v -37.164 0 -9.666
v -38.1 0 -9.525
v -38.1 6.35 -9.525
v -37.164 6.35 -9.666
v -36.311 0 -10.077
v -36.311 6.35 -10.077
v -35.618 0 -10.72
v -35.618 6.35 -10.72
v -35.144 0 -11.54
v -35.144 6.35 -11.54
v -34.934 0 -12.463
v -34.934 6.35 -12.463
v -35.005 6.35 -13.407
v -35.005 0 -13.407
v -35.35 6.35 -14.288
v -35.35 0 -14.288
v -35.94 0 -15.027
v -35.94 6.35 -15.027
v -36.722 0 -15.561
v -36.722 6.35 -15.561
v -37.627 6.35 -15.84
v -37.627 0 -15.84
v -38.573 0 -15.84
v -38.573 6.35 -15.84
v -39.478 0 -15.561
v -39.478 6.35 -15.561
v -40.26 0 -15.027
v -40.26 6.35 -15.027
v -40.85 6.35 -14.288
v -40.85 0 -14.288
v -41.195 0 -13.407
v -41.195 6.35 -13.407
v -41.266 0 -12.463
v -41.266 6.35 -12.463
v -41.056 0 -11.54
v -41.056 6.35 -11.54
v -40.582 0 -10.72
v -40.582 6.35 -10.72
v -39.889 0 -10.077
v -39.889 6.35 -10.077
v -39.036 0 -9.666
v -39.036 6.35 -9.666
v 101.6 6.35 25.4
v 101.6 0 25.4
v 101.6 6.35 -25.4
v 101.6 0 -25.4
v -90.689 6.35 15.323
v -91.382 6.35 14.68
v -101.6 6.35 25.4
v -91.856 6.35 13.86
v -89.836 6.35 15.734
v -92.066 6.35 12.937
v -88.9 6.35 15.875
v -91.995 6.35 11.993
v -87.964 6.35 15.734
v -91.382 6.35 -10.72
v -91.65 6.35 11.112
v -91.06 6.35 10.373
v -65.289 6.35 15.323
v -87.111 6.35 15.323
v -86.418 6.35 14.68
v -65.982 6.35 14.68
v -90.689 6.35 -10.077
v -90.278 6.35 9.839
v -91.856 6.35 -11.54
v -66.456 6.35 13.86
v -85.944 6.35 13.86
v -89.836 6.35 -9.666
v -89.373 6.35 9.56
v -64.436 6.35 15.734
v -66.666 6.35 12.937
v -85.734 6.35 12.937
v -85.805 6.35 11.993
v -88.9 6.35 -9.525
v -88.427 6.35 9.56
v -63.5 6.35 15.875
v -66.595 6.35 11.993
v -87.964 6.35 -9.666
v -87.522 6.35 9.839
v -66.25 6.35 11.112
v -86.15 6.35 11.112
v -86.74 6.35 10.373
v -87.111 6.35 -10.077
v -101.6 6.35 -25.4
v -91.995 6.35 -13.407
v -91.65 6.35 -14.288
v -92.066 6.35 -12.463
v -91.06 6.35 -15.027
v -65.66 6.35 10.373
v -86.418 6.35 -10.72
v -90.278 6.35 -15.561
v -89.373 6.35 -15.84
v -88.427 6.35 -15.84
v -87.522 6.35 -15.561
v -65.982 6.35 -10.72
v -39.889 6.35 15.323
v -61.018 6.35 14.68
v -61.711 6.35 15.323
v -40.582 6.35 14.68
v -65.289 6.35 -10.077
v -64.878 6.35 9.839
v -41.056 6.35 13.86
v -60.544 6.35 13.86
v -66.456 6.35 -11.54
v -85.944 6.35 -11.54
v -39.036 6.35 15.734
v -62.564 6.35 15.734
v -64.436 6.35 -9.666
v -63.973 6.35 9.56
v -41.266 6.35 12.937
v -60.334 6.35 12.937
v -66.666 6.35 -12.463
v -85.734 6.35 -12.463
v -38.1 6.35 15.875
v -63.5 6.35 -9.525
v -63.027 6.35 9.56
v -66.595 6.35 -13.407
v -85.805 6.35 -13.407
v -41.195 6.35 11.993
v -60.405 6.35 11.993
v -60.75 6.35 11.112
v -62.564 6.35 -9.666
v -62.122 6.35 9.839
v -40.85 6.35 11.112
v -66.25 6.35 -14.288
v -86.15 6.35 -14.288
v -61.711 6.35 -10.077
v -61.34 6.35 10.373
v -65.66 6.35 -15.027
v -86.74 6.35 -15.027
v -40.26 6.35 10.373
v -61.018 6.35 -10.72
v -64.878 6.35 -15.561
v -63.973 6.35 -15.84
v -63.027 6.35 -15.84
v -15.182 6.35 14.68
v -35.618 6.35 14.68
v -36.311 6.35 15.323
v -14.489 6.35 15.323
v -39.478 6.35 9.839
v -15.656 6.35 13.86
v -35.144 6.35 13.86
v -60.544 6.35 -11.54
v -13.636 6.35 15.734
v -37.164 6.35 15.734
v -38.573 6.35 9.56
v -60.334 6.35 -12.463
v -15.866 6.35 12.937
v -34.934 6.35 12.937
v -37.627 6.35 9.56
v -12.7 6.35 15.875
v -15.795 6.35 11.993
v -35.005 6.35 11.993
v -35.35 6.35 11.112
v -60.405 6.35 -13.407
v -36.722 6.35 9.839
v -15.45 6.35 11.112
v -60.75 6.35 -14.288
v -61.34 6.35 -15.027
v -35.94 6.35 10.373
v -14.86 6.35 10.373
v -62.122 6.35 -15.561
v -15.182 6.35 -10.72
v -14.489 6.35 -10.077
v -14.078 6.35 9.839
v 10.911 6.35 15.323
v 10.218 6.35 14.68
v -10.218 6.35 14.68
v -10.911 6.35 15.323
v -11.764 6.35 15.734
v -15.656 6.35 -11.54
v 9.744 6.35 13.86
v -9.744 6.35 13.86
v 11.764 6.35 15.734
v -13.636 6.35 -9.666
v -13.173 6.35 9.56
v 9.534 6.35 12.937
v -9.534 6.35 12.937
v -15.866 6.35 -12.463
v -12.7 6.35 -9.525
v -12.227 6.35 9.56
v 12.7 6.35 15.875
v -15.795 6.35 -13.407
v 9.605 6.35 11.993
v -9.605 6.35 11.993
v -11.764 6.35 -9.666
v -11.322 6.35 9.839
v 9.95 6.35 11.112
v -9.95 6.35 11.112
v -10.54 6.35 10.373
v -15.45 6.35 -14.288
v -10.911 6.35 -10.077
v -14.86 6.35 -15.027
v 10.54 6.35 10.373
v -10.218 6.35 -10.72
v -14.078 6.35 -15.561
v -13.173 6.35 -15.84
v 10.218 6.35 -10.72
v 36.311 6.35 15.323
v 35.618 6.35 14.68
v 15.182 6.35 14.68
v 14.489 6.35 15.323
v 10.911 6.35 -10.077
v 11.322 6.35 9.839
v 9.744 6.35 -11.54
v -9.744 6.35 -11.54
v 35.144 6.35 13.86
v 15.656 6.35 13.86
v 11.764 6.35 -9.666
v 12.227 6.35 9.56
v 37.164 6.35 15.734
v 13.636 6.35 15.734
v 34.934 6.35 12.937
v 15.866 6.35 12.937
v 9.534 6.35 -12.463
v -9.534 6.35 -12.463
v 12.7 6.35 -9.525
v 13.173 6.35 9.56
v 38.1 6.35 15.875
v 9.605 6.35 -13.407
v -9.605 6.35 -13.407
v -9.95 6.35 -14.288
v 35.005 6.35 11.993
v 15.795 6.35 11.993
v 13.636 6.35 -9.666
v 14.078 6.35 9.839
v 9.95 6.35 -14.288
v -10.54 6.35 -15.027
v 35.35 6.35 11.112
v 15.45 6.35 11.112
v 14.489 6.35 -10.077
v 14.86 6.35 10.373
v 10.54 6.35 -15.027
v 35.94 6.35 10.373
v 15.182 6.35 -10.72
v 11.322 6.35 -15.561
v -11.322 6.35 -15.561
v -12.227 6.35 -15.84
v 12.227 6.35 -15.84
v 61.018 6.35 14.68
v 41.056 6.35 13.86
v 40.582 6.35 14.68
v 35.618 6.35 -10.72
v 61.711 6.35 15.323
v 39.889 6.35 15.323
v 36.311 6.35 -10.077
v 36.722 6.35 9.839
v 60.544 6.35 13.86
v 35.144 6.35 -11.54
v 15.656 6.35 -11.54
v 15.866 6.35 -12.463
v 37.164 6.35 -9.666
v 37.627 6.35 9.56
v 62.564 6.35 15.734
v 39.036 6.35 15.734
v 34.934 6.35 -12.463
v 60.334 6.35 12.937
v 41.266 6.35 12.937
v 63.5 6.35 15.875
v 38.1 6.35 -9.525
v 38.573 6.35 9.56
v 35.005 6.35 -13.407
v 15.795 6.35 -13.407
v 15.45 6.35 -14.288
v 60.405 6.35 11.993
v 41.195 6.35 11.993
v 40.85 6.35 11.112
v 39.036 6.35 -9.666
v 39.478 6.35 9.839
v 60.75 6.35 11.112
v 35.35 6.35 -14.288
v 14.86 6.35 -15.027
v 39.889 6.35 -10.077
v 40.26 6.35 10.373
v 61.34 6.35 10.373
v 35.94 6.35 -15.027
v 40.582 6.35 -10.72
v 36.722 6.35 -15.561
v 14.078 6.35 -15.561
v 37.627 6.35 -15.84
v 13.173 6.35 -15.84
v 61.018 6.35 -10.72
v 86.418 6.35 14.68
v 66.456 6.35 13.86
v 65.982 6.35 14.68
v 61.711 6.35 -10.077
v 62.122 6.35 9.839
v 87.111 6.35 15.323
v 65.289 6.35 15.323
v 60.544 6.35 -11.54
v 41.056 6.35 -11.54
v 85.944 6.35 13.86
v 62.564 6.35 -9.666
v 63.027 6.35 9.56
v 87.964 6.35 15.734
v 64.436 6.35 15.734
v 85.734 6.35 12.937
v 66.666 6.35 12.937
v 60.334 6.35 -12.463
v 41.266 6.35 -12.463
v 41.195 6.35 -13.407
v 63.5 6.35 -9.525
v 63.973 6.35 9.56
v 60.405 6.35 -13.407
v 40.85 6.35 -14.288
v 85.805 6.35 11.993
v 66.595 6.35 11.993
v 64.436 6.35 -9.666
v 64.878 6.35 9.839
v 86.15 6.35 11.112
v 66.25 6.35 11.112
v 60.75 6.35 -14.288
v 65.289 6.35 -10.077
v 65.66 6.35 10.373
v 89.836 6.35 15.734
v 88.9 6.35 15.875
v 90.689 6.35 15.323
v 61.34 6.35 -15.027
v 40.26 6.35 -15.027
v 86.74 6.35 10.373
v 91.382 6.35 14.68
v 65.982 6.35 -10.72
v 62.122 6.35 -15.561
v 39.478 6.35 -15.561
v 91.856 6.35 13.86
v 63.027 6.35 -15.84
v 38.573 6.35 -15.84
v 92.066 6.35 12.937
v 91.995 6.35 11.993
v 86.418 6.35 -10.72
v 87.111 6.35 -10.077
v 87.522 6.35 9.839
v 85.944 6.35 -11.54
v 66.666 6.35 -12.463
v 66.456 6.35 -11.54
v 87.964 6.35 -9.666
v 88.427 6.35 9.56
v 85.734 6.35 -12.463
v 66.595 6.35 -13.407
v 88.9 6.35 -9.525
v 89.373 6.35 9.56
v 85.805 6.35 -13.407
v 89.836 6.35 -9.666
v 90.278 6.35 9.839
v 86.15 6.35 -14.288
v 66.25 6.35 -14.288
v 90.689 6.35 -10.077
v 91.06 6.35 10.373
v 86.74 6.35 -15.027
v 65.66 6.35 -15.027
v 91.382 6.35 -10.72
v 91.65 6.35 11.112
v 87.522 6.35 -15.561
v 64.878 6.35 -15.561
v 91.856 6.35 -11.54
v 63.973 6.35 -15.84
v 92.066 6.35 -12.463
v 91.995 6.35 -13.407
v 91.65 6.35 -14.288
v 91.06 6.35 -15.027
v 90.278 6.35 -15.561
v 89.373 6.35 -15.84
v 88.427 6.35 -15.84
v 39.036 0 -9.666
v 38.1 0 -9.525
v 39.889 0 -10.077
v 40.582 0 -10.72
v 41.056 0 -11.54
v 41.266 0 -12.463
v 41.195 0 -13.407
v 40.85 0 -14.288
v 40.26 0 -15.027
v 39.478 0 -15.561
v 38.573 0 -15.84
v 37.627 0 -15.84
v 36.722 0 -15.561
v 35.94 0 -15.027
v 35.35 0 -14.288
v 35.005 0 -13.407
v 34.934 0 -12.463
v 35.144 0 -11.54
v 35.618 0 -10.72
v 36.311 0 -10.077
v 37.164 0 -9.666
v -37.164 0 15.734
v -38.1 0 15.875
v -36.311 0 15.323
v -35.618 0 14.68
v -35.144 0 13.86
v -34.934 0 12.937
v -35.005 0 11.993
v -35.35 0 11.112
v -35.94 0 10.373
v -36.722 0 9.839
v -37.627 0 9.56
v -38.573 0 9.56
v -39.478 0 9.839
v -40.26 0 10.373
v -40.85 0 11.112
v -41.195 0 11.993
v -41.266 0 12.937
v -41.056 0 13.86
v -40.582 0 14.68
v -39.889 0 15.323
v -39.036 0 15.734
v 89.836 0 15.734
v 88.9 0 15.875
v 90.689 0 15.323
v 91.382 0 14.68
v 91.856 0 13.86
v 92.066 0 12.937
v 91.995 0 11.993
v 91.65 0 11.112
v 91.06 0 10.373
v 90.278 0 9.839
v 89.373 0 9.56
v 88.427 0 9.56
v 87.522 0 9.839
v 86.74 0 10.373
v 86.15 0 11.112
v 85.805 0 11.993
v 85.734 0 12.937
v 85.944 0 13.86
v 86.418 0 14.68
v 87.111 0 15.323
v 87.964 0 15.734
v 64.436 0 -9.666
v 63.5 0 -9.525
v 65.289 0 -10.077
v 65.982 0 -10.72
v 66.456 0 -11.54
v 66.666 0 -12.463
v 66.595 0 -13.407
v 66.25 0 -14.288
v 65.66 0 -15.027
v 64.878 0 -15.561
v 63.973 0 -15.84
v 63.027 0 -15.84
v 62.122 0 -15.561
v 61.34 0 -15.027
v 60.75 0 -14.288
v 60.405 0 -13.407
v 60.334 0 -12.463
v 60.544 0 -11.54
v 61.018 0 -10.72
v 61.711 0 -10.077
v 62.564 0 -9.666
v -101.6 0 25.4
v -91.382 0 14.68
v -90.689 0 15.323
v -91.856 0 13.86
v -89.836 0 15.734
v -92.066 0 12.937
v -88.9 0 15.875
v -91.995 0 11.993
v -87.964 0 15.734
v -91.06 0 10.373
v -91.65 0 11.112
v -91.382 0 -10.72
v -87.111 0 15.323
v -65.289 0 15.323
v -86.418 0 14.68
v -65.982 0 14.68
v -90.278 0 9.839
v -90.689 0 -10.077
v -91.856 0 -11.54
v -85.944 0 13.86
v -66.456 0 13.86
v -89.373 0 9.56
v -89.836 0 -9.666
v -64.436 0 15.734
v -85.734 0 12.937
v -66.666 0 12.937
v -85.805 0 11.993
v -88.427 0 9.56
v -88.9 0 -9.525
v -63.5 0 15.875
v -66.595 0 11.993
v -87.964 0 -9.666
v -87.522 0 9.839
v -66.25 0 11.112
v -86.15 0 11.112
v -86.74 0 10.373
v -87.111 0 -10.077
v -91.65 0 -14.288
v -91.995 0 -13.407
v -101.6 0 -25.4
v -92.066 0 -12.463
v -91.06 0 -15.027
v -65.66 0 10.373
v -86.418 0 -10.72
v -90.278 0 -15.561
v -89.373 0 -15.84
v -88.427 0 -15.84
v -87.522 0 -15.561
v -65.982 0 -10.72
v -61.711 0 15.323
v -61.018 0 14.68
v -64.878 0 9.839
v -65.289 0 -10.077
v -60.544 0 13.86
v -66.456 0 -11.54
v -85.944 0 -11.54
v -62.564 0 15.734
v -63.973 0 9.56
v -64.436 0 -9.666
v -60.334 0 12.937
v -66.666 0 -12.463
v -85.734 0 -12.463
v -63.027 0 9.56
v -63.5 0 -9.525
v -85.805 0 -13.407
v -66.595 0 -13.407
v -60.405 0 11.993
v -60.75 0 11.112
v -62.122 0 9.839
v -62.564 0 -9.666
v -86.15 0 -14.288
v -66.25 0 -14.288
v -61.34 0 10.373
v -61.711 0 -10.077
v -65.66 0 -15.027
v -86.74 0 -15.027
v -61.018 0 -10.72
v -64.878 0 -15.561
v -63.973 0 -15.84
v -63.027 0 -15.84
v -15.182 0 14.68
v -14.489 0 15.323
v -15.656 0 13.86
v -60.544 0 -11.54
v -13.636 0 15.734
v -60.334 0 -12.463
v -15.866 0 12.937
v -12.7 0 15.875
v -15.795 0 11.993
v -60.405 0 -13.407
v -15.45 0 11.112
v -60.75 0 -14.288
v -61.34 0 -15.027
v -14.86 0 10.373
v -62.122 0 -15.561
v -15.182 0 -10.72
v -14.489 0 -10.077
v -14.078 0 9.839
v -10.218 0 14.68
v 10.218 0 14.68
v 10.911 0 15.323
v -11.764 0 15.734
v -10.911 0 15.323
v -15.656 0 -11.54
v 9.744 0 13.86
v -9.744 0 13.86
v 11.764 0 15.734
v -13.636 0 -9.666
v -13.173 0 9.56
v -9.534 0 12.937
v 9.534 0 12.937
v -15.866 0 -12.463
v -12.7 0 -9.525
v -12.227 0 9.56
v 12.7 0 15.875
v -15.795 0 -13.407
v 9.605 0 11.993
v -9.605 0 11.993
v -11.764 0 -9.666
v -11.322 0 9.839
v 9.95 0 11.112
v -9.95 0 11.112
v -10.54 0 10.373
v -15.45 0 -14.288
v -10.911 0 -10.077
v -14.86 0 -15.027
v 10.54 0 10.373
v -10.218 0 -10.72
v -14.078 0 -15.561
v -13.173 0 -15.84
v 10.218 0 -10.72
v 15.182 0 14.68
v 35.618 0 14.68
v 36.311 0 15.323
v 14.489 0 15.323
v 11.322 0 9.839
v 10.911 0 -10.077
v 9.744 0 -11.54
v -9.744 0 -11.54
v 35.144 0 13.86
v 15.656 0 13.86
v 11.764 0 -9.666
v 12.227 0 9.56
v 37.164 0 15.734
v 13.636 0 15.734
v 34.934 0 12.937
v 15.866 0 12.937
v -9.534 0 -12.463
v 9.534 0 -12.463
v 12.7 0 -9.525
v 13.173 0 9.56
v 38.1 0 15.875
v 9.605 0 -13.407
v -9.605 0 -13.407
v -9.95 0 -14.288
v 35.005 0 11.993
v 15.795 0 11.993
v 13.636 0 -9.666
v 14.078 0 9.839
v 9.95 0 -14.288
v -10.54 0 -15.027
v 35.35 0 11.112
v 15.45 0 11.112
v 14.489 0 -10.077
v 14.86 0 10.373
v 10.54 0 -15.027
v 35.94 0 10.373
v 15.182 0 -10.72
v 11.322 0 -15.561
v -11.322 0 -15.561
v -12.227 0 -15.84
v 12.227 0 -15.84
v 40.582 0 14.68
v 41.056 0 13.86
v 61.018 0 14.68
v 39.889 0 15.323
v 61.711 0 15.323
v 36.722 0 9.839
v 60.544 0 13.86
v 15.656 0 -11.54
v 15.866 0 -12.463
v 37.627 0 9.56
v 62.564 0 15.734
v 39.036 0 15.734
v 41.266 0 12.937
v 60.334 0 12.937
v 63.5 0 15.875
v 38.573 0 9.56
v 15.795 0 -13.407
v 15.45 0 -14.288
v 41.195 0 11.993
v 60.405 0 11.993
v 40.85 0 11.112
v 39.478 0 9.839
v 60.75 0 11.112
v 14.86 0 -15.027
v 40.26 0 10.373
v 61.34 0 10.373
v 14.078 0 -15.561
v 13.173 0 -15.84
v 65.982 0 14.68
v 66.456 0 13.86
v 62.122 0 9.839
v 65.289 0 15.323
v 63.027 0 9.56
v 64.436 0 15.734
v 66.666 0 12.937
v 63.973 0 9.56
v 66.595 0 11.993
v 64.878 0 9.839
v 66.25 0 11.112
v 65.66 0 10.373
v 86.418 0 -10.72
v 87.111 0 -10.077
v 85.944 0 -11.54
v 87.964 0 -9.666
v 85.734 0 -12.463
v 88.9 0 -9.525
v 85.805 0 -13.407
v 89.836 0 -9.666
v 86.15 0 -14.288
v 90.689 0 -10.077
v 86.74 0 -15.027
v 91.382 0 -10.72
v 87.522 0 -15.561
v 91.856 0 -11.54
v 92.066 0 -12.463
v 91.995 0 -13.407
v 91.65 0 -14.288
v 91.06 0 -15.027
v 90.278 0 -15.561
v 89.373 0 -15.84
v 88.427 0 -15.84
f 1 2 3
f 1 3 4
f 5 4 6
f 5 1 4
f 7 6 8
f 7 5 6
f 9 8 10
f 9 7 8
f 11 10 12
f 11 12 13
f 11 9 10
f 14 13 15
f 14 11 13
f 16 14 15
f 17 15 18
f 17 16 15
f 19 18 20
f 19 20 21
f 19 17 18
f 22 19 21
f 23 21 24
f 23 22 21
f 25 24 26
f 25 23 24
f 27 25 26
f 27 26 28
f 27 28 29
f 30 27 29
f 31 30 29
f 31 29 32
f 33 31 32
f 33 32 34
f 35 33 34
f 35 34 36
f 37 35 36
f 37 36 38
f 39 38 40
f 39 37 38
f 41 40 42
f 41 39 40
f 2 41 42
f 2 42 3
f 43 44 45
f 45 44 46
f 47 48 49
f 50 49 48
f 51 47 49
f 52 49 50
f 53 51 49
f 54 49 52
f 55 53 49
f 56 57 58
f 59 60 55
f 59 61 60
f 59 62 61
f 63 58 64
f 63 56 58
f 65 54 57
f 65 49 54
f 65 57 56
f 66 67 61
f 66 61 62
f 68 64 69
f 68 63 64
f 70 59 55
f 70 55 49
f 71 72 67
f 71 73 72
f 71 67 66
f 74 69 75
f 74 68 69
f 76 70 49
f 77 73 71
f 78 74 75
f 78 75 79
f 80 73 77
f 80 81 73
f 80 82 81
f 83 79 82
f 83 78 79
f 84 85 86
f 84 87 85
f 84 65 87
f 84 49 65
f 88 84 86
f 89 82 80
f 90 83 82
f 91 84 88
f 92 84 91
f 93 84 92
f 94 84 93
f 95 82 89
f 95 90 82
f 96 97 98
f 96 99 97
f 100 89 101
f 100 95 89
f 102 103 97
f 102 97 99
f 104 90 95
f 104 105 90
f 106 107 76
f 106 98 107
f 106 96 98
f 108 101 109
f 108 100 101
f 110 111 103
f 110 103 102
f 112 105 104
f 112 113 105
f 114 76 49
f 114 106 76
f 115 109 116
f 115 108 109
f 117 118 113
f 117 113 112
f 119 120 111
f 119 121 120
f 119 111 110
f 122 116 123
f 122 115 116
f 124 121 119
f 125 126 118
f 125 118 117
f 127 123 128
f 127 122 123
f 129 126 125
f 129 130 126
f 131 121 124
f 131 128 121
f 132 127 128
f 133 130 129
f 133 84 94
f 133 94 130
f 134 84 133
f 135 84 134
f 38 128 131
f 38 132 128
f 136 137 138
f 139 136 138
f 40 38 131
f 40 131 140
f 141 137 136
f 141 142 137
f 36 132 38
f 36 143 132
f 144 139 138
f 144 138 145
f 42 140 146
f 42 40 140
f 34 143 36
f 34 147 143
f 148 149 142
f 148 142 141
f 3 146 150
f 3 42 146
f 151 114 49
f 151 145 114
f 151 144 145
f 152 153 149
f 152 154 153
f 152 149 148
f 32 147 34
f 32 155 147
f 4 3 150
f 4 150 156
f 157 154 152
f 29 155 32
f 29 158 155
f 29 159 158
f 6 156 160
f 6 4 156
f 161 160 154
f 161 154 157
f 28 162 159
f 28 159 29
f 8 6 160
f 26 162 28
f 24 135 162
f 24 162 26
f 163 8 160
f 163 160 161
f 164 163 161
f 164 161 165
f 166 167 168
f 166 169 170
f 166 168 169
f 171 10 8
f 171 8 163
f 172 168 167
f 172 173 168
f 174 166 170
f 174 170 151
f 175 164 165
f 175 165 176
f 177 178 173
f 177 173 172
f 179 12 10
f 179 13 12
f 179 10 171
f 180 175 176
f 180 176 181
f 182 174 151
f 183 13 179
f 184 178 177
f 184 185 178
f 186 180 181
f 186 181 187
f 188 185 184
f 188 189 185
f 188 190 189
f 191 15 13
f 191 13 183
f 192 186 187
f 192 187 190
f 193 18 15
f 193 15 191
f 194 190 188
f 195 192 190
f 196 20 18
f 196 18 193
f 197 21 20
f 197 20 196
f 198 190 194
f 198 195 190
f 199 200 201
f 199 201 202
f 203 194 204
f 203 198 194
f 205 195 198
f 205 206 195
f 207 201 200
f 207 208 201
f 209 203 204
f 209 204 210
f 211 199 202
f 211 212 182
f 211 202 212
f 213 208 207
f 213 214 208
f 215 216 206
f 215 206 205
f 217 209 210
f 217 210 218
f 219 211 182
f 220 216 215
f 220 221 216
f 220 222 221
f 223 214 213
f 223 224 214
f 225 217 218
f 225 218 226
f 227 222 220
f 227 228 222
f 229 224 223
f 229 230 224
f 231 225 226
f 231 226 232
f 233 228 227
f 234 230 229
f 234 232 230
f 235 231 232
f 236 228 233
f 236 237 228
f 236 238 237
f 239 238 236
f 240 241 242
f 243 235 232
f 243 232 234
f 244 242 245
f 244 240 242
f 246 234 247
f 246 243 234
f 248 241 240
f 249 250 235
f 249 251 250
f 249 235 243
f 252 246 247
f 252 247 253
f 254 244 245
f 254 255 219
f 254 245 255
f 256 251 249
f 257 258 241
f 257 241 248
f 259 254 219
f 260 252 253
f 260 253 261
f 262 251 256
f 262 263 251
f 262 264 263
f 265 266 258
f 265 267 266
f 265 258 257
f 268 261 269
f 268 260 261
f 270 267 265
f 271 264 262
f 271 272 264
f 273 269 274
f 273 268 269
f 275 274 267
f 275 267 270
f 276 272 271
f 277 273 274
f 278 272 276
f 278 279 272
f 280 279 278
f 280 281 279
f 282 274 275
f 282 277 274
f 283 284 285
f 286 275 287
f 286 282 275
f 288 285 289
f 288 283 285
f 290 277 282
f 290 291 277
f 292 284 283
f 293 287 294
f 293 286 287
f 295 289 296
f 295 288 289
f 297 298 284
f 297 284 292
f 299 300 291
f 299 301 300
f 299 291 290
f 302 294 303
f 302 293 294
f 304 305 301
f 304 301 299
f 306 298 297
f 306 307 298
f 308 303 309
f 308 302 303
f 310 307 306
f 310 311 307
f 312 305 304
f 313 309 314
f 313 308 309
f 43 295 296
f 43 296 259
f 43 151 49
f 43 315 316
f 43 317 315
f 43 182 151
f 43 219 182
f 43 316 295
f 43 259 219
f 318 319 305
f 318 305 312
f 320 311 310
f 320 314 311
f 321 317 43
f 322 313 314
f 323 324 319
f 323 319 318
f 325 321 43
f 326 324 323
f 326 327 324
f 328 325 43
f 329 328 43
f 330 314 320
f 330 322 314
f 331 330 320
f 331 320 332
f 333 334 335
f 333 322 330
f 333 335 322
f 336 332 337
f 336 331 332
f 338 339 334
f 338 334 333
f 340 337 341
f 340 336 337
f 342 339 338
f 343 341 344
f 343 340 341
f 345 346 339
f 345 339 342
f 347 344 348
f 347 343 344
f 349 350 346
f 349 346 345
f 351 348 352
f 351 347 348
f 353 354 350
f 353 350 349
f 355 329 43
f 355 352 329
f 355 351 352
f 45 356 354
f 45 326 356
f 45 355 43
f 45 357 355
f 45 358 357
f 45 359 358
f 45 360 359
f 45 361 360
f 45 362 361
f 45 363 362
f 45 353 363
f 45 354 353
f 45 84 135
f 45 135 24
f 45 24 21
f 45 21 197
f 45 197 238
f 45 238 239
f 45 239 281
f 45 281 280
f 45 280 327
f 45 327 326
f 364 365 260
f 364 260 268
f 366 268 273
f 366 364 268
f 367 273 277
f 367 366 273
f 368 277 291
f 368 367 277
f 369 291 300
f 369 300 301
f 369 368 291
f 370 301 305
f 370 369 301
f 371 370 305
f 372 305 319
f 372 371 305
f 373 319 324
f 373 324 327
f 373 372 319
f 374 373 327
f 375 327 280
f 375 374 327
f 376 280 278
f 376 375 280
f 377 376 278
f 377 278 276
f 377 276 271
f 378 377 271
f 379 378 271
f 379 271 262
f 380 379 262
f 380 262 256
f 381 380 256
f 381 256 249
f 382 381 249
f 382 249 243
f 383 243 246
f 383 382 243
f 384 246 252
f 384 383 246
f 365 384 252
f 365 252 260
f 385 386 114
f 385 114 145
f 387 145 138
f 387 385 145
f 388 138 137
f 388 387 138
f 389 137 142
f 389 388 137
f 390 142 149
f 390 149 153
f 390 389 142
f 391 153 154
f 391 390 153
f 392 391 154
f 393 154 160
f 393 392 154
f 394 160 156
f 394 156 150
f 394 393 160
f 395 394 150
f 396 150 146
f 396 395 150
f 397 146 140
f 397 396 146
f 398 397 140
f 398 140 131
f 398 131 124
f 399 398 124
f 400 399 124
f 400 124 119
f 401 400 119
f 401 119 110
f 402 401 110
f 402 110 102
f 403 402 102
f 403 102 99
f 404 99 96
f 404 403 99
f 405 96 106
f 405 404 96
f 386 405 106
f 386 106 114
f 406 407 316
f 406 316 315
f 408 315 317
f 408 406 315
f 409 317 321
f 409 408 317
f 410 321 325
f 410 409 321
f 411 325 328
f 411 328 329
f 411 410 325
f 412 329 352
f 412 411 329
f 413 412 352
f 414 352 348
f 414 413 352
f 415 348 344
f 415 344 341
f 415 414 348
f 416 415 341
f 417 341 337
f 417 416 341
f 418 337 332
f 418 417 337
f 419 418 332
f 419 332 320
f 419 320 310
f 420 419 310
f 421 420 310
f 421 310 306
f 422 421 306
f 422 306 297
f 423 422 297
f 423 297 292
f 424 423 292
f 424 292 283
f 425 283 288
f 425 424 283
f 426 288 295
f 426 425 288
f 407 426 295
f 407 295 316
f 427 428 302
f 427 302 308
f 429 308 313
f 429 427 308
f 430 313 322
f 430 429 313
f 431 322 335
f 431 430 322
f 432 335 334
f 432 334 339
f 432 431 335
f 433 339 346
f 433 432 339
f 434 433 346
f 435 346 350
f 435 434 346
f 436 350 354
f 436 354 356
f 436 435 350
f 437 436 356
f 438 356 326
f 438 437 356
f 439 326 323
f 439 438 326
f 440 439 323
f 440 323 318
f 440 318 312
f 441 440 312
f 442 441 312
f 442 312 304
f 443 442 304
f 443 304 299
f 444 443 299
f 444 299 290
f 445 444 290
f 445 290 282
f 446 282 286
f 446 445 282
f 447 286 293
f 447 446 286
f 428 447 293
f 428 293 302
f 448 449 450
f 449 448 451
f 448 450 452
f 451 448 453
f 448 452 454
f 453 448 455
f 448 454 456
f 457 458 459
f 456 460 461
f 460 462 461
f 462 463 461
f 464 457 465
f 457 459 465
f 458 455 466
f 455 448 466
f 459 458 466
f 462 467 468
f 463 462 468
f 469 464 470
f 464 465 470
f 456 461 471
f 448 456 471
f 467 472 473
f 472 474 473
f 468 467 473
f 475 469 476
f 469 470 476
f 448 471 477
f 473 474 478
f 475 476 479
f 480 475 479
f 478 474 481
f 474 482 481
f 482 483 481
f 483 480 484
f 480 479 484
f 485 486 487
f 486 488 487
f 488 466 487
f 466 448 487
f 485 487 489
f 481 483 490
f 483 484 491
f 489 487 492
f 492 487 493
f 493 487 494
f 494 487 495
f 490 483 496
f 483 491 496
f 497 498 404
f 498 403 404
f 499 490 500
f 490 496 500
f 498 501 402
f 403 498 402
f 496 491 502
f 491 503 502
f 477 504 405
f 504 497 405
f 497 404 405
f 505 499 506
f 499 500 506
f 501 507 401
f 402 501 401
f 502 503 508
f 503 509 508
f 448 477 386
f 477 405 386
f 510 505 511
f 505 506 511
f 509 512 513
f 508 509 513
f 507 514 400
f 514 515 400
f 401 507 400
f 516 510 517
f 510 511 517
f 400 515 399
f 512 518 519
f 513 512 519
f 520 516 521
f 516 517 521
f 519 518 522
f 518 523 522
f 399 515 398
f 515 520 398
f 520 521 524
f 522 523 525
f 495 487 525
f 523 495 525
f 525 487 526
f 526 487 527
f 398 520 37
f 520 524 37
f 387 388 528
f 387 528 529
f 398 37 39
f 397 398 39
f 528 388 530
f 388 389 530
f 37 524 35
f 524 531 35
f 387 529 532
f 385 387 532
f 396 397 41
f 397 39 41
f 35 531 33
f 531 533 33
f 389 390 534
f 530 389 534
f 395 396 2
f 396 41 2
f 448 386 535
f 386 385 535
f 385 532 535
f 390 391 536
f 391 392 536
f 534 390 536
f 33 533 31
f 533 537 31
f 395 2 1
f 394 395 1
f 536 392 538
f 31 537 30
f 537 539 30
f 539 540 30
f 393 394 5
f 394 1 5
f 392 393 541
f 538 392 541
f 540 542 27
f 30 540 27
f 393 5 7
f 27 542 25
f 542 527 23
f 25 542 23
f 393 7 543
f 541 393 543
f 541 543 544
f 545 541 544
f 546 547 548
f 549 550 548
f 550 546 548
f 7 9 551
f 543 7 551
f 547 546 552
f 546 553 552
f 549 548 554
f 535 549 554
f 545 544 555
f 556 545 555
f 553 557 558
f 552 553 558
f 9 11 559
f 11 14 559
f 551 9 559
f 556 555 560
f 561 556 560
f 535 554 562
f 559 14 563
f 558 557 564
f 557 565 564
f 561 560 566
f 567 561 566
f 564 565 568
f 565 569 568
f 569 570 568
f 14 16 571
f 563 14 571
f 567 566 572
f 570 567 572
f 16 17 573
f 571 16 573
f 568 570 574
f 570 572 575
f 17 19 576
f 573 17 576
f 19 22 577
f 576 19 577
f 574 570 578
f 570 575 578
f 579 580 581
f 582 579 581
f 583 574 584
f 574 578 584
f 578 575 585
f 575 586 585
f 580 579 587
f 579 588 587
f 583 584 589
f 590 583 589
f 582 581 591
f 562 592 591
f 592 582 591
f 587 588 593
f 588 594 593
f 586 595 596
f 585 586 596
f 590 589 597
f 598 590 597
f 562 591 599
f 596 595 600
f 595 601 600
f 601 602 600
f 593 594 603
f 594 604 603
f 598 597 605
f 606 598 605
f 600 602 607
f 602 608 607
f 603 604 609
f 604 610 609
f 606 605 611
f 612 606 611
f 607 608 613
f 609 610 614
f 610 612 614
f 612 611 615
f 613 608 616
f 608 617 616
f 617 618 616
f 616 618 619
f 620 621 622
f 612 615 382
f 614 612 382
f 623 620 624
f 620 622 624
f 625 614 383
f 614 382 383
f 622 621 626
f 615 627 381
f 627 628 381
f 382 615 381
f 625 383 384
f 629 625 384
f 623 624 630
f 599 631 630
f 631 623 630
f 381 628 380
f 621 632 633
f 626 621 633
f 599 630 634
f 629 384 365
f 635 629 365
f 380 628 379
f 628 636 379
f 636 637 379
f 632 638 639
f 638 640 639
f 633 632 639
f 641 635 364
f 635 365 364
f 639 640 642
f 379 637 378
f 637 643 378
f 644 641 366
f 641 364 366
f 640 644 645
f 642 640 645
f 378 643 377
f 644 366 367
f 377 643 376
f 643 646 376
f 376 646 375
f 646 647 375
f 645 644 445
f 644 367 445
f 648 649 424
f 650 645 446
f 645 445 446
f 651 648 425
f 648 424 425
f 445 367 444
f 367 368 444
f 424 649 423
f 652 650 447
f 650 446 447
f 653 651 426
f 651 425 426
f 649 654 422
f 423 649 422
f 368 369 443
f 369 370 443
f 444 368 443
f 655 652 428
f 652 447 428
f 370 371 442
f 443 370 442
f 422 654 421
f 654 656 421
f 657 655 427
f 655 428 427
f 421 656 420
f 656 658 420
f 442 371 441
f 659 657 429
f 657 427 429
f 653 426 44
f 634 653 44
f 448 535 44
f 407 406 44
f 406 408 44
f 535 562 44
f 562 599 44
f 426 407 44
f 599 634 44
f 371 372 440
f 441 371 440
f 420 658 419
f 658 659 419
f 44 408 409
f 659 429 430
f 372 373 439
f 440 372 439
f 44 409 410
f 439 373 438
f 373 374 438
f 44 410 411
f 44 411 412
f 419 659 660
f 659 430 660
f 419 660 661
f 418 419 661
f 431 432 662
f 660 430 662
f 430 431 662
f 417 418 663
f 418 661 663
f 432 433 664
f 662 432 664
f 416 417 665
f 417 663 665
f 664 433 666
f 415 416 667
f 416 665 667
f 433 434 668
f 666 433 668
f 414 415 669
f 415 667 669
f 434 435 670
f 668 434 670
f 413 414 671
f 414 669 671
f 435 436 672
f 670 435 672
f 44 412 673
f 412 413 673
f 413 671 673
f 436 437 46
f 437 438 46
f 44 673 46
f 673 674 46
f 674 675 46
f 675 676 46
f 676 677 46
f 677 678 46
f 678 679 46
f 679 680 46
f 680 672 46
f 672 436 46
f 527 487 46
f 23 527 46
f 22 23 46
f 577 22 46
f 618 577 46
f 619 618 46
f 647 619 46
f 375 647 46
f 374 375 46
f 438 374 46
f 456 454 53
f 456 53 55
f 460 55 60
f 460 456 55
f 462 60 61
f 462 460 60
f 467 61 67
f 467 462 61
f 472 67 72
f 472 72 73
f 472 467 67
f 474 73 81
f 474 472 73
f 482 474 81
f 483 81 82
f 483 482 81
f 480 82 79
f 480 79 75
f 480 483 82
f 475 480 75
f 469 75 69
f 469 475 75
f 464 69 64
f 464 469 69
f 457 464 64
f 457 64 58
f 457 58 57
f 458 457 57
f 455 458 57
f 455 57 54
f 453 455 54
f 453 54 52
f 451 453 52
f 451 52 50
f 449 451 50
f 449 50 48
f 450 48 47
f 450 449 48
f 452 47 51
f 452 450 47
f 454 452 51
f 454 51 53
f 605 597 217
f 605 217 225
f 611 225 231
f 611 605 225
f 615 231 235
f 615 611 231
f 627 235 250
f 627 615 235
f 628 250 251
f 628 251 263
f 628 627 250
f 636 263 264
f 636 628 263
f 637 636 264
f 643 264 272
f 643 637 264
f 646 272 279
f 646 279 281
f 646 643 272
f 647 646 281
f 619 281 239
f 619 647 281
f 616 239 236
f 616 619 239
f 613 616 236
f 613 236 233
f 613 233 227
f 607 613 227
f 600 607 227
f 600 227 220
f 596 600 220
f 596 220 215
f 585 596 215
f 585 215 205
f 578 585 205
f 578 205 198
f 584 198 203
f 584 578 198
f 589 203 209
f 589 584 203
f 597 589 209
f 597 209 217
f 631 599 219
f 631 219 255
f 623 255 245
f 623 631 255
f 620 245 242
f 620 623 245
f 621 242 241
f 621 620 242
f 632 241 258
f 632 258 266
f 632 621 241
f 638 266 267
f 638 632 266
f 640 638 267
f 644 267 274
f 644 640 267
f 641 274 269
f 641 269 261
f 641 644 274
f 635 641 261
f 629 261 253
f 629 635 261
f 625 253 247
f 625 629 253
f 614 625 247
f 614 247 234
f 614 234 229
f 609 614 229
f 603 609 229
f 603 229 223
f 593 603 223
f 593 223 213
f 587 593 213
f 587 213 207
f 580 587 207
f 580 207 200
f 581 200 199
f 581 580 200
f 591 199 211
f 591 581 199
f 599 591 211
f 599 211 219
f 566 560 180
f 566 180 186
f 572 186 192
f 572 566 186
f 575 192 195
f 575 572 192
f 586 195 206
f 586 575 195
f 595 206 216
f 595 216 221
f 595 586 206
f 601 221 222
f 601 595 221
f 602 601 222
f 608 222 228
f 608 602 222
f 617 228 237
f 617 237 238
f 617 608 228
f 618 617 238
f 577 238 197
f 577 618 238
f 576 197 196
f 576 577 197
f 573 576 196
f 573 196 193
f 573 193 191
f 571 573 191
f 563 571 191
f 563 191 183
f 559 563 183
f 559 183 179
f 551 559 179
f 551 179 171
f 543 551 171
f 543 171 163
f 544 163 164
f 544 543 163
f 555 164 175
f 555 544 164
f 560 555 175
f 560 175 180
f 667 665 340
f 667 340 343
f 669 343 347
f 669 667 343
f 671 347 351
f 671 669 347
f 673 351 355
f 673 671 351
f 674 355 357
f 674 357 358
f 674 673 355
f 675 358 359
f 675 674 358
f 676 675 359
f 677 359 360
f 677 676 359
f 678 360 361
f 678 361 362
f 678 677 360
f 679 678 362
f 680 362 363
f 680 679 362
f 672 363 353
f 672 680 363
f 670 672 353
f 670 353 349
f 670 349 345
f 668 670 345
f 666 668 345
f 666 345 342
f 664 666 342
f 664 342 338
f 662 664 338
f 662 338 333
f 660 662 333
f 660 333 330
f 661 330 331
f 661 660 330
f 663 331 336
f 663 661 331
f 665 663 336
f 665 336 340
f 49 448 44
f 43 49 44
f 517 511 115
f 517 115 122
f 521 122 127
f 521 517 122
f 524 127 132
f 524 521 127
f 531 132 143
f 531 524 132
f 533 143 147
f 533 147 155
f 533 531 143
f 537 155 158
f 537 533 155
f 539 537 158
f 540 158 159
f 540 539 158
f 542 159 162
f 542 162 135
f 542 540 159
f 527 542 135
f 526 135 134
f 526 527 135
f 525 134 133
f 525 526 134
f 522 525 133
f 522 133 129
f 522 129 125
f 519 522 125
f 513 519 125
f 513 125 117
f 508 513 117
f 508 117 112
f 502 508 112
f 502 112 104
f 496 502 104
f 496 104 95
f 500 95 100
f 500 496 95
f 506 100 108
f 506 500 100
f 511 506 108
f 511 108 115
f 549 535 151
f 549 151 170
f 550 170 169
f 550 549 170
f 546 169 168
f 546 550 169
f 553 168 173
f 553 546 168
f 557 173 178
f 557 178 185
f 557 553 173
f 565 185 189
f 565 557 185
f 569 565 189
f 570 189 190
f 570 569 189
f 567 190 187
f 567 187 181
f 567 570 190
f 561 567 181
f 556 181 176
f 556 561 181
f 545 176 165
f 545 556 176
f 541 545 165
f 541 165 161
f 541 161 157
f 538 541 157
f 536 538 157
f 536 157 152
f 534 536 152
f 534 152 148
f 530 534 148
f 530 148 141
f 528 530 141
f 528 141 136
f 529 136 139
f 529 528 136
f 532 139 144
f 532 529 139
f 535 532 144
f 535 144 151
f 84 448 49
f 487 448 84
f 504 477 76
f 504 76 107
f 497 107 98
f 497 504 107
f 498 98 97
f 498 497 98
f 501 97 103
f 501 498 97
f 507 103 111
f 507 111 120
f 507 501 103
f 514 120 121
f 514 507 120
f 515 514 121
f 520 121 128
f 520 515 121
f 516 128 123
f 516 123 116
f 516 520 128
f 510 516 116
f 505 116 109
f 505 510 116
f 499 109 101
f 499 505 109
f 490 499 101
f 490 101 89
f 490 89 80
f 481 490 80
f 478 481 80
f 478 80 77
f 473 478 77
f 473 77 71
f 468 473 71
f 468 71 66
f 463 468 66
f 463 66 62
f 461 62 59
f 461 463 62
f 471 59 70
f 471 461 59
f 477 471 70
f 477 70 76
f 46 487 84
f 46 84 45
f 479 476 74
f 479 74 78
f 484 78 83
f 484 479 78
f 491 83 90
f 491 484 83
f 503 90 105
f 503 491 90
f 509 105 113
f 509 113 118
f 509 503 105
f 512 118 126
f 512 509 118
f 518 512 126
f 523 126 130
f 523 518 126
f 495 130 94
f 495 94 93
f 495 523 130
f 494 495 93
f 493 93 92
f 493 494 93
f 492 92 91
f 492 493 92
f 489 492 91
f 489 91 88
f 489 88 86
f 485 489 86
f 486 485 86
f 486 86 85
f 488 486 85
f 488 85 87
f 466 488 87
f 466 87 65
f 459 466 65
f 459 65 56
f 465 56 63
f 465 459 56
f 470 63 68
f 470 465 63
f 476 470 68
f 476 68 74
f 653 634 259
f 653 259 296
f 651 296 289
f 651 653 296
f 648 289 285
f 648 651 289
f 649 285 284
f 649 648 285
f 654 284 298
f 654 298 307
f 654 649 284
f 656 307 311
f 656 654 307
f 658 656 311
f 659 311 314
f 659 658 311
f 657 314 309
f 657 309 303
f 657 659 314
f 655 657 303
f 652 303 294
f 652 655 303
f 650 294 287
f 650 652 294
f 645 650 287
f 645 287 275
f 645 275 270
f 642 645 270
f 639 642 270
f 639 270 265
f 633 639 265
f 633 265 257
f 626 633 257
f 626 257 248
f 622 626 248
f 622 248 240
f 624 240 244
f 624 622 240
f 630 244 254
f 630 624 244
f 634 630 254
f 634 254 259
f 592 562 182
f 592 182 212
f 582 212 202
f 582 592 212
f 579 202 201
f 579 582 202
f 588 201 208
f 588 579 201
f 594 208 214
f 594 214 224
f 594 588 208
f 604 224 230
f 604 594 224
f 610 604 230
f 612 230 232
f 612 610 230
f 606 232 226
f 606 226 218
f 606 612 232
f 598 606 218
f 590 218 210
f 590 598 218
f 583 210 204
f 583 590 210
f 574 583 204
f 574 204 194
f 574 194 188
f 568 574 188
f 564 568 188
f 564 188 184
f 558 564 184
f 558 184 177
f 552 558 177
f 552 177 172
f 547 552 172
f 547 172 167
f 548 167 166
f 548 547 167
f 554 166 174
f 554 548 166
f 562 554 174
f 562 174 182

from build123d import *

# Parameters (mm, degrees)
SKETCH1_W           = 203.2
SKETCH1_H           = 50.8
SKETCH1_R           = 3.175
BOSS_EXTRUDE1_DEPTH = 6.35


with BuildPart() as part:
    # Sketch1 → Boss-Extrude1 (new body)
    with BuildSketch(Plane(origin=(0, 0, 0), x_dir=(1, 0, 0), z_dir=(0, 1, 0))):
        Rectangle(SKETCH1_W, SKETCH1_H)
        with Locations(Location((-88.9, 12.7, 0), (0, 0, 270))):
            Circle(SKETCH1_R, mode=Mode.SUBTRACT)
        with Locations(Location((-63.5, 12.7, 0), (0, 0, 270))):
            Circle(SKETCH1_R, mode=Mode.SUBTRACT)
        with Locations(Location((-38.1, 12.7, 0), (0, 0, 270))):
            Circle(SKETCH1_R, mode=Mode.SUBTRACT)
        with Locations(Location((-12.7, 12.7, 0), (0, 0, 270))):
            Circle(SKETCH1_R, mode=Mode.SUBTRACT)
        with Locations(Location((12.7, 12.7, 0), (0, 0, 270))):
            Circle(SKETCH1_R, mode=Mode.SUBTRACT)
        with Locations(Location((38.1, 12.7, 0), (0, 0, 270))):
            Circle(SKETCH1_R, mode=Mode.SUBTRACT)
        with Locations(Location((63.5, 12.7, 0), (0, 0, 270))):
            Circle(SKETCH1_R, mode=Mode.SUBTRACT)
        with Locations(Location((88.9, 12.7, 0), (0, 0, 270))):
            Circle(SKETCH1_R, mode=Mode.SUBTRACT)
        with Locations(Location((-63.5, -12.7, 0), (0, 0, 270))):
            Circle(SKETCH1_R, mode=Mode.SUBTRACT)
        with Locations(Location((-38.1, -12.7, 0), (0, 0, 270))):
            Circle(SKETCH1_R, mode=Mode.SUBTRACT)
        with Locations(Location((-12.7, -12.7, 0), (0, 0, 270))):
            Circle(SKETCH1_R, mode=Mode.SUBTRACT)
        with Locations(Location((12.7, -12.7, 0), (0, 0, 270))):
            Circle(SKETCH1_R, mode=Mode.SUBTRACT)
        with Locations(Location((38.1, -12.7, 0), (0, 0, 270))):
            Circle(SKETCH1_R, mode=Mode.SUBTRACT)
        with Locations(Location((63.5, -12.7, 0), (0, 0, 270))):
            Circle(SKETCH1_R, mode=Mode.SUBTRACT)
        with Locations(Location((88.9, -12.7, 0), (0, 0, 270))):
            Circle(SKETCH1_R, mode=Mode.SUBTRACT)
        with Locations(Location((-88.9, -12.7, 0), (0, 0, 270))):
            Circle(SKETCH1_R, mode=Mode.SUBTRACT)
    extrude(amount=BOSS_EXTRUDE1_DEPTH)


solid = part.part
